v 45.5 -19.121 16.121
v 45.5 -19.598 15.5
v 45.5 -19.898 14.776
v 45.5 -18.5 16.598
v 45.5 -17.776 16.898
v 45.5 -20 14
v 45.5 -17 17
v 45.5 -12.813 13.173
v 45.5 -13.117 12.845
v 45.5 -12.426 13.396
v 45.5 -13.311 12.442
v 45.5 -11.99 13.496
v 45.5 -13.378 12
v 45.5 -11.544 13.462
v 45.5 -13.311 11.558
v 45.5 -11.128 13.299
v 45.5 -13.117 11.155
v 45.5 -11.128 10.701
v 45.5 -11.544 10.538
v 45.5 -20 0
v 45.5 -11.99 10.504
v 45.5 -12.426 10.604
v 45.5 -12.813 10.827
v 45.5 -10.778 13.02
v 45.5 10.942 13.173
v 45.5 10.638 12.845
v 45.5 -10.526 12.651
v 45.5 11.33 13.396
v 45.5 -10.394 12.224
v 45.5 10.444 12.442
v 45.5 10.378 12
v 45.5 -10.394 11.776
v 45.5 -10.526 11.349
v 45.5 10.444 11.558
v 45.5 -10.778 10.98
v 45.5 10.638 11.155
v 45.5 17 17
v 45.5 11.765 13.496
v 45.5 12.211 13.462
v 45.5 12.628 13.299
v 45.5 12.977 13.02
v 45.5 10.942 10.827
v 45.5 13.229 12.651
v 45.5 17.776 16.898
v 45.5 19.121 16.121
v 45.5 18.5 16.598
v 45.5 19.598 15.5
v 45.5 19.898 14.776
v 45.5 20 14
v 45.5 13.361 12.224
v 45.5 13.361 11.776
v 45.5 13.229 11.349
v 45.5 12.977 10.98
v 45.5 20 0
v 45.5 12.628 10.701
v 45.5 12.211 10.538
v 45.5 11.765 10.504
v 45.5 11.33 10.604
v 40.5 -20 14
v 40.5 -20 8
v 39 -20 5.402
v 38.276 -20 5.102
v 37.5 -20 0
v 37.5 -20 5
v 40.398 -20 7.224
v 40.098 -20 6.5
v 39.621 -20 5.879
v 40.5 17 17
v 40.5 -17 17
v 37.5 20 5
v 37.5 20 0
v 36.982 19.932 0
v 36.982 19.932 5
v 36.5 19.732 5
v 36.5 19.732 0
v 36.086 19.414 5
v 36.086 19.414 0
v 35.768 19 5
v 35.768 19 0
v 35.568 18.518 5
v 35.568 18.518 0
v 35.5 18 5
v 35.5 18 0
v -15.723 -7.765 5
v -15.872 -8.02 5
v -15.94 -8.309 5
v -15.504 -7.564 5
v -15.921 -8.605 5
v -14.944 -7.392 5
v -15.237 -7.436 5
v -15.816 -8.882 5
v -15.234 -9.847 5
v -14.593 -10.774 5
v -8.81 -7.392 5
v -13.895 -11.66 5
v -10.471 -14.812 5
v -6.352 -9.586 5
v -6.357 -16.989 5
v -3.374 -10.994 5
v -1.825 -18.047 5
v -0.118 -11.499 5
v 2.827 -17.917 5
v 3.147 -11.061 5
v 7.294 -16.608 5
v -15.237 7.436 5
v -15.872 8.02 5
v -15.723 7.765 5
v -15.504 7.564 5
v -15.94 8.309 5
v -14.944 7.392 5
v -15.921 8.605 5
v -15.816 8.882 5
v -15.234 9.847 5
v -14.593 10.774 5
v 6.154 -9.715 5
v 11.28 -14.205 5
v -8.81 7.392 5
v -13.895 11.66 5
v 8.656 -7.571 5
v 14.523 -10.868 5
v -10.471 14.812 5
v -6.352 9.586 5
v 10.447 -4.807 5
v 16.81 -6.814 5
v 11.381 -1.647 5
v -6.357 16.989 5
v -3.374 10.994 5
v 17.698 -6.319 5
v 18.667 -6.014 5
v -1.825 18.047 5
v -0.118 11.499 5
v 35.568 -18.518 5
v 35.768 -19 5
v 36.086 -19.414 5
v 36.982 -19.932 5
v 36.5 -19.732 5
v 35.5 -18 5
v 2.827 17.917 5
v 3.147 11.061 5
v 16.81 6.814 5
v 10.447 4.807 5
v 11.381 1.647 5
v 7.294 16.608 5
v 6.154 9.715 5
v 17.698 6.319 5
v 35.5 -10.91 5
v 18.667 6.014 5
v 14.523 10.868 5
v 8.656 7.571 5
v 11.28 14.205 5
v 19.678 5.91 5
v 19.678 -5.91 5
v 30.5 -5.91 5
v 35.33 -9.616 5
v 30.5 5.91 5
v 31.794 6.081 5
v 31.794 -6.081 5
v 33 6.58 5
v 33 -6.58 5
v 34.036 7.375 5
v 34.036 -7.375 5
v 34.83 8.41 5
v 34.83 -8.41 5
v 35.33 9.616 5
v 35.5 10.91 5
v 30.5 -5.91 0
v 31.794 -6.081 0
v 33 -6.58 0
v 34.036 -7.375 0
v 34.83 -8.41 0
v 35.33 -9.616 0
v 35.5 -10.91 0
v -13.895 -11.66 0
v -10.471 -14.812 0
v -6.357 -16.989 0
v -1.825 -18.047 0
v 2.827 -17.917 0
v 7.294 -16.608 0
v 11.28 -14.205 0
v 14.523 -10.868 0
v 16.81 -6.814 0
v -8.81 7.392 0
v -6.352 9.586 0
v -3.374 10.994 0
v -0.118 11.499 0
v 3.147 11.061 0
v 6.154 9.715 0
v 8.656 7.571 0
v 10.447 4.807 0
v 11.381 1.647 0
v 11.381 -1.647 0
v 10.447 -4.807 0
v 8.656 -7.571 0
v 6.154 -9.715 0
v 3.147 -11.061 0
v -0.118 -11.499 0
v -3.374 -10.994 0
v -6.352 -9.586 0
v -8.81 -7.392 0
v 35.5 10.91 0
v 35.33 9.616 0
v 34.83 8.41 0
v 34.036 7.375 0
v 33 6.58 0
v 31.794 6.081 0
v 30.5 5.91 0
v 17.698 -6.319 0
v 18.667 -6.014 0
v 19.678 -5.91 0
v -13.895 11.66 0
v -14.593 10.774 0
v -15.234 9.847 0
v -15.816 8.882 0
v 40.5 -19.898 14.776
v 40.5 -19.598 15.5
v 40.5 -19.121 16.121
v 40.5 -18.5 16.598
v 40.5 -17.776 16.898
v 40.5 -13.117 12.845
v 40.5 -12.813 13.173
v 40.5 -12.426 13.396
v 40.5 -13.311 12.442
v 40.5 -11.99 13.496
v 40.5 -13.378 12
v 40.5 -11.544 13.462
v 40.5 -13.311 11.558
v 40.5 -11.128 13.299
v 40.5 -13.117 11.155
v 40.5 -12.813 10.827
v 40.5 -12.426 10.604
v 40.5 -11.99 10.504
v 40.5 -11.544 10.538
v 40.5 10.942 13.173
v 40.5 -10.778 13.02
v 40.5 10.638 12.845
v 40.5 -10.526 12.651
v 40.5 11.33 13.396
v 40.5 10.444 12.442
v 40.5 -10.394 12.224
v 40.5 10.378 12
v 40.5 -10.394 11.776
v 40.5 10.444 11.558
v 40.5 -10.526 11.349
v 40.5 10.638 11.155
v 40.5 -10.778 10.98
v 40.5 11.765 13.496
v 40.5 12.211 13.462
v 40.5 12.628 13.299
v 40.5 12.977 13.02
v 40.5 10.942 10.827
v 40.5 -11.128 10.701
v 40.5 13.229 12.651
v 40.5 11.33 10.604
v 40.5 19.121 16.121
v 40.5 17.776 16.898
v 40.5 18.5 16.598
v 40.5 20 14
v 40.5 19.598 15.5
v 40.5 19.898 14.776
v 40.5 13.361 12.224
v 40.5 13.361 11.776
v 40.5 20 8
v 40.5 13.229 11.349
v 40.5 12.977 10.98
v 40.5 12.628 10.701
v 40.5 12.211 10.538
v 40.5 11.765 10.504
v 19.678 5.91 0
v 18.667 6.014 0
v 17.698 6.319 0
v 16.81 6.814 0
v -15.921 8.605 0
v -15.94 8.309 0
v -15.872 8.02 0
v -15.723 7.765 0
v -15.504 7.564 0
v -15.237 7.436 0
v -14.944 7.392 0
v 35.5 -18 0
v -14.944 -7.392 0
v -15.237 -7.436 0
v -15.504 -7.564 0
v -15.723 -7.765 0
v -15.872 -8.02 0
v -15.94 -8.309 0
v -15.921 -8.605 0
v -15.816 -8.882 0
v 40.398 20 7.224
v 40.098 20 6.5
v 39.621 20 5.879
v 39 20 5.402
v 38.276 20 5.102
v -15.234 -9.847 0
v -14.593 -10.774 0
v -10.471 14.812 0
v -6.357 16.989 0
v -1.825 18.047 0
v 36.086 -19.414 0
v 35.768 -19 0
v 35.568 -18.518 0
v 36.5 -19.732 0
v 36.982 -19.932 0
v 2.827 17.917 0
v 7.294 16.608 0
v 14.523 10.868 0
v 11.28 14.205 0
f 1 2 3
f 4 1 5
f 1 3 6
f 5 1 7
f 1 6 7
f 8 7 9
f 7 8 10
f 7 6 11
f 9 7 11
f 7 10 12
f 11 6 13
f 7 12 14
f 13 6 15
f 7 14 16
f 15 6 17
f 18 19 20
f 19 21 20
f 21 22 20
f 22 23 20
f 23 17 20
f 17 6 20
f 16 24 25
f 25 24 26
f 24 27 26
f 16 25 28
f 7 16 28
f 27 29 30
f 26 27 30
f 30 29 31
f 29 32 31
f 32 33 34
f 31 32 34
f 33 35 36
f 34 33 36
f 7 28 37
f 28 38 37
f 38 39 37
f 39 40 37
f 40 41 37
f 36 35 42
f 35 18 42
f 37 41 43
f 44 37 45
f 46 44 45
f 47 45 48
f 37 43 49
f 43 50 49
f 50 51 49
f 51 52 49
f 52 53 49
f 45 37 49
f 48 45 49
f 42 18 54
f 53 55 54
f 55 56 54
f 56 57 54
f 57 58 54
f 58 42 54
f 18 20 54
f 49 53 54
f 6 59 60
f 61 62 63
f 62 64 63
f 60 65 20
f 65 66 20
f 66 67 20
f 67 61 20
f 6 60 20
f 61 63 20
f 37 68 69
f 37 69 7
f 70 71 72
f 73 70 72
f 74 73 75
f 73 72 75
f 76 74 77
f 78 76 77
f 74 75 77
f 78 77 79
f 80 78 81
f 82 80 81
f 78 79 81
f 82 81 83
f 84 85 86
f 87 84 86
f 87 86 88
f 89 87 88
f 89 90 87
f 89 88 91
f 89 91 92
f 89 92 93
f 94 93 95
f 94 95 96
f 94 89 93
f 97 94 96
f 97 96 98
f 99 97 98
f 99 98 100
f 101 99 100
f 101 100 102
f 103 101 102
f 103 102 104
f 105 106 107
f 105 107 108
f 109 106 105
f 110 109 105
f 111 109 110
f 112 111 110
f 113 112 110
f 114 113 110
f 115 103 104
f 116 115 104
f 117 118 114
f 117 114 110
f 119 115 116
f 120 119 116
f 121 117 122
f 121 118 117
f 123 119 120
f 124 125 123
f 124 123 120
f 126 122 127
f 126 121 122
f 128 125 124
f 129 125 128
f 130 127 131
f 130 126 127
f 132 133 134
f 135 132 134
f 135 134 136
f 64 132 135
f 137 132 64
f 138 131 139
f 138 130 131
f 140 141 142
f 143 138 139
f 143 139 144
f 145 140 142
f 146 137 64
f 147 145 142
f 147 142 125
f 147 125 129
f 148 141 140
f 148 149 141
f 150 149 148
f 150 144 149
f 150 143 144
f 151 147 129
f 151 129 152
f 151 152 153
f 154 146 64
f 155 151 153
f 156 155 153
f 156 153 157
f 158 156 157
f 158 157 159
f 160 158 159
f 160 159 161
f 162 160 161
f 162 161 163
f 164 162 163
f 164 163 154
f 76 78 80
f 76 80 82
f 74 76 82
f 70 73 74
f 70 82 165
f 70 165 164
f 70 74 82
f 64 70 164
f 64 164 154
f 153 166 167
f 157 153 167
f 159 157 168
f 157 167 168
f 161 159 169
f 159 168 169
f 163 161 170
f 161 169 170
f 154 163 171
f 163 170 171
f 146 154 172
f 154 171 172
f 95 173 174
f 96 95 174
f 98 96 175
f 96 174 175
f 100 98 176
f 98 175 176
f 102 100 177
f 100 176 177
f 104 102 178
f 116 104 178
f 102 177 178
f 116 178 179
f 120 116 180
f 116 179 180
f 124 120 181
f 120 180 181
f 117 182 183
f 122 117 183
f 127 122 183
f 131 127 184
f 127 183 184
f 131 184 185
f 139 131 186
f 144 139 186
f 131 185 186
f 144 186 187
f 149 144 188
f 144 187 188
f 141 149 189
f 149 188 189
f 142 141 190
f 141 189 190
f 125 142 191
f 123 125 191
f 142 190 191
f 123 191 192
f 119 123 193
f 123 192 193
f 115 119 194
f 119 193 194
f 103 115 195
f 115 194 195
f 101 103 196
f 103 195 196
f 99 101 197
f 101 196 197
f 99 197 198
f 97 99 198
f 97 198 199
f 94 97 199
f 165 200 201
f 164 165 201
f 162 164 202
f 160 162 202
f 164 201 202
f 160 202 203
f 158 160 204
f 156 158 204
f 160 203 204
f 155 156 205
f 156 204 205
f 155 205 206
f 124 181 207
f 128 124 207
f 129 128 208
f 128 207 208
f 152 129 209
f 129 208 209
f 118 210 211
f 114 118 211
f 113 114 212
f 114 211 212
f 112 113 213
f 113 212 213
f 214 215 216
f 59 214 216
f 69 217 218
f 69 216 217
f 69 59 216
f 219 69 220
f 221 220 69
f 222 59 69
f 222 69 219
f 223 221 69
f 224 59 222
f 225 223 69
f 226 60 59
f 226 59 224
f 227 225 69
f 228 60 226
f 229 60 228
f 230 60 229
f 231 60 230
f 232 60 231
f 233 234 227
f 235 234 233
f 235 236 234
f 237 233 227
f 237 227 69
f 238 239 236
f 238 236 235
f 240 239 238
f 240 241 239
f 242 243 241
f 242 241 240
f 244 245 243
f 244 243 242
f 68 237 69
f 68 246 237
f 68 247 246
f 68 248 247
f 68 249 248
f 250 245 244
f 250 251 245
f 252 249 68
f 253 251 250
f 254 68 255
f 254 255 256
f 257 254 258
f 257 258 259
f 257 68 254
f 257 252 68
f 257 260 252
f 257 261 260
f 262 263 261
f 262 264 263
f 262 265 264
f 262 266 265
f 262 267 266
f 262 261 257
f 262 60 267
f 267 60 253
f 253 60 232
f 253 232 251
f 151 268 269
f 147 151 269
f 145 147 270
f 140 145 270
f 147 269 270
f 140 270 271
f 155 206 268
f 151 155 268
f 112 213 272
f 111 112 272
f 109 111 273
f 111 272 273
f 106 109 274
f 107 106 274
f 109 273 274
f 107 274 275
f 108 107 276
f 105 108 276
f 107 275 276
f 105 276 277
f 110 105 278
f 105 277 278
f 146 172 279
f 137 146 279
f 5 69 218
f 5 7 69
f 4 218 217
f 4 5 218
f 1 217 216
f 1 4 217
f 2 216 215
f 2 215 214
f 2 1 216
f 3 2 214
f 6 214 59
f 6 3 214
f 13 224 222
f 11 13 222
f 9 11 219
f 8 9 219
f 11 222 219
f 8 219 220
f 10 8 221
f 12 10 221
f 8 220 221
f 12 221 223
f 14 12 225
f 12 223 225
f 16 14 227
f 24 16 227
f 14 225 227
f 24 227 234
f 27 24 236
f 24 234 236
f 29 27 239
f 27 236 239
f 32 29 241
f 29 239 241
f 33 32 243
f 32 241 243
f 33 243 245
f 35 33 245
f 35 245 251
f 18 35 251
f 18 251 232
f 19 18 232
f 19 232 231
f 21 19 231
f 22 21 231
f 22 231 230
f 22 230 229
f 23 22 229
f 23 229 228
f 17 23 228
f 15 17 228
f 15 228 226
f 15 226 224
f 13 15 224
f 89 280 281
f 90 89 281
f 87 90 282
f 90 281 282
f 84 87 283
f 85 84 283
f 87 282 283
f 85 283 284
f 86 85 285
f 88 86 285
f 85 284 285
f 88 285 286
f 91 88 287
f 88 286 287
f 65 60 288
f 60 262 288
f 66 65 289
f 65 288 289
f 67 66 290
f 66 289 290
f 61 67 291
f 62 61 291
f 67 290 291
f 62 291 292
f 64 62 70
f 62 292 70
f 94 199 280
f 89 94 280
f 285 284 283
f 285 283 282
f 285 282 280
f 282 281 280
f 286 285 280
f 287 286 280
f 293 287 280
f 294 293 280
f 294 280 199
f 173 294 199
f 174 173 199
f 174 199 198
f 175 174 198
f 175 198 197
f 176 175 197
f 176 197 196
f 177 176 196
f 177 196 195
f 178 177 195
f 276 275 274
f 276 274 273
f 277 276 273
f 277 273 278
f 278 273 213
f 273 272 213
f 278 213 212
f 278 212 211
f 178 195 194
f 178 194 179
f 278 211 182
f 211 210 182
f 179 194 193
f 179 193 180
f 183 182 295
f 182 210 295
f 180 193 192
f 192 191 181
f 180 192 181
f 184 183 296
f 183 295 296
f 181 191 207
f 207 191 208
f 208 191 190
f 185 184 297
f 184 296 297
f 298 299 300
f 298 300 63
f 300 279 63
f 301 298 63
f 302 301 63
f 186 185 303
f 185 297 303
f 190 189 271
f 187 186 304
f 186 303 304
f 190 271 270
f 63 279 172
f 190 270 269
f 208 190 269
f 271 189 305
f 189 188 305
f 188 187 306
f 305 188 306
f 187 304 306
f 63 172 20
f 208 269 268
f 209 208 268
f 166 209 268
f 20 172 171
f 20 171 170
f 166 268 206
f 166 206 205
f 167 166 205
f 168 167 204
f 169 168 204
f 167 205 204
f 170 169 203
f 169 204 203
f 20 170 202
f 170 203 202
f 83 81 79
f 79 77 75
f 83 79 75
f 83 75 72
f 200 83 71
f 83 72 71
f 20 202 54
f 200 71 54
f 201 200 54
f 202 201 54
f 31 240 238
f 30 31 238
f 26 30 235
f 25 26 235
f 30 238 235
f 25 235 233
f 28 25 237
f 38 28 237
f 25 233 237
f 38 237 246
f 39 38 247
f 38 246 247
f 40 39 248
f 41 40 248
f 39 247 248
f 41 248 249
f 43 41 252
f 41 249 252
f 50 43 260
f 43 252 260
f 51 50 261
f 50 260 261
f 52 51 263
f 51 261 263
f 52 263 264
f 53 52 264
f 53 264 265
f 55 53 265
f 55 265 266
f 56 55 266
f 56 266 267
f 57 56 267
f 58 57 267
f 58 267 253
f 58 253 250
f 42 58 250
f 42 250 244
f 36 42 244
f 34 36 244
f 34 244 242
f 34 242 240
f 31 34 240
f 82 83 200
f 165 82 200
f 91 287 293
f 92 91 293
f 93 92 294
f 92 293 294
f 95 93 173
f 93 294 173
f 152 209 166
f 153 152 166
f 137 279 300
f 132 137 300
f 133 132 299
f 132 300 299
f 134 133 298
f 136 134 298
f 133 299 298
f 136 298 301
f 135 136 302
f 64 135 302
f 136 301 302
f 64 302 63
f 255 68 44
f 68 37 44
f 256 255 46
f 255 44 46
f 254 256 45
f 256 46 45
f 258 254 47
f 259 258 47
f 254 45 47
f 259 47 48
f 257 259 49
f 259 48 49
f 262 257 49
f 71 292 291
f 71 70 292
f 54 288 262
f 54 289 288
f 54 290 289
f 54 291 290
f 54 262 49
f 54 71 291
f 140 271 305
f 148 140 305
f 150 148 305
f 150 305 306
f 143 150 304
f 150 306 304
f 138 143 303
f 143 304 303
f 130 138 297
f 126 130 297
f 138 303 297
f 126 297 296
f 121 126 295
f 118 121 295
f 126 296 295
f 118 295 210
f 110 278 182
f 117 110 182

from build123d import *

# Parameters (mm, degrees)
F1_DEPTH = 5
F2_W     = 5
F2_H     = 40
F3_DEPTH = 12
F4_R     = 3
F5_R     = 1.5
F6_DEPTH = 10


with BuildPart() as f1:
    # F0 (on Top) → F1 (new body)
    with BuildSketch(Plane.XY):
        with BuildLine():
            ThreePointArc((-8.809511, 7.392058), (11.5, 0), (-8.809511, -7.392058))
            Line((-8.809511, -7.392058), (-14.94391, -7.392058))
            ThreePointArc((-14.94391, -7.392058), (-15.806941, -7.886907), (-15.815832, -8.881703))
            ThreePointArc((-15.815832, -8.881703), (-14.920363, -10.315422), (-13.895319, -11.659557))
            ThreePointArc((-13.895319, -11.659557), (2.827372, -17.917342), (16.810487, -6.814154))
            ThreePointArc((16.810487, -6.814154), (18.174589, -6.14164), (19.677769, -5.910335))
            Line((19.677769, -5.910335), (30.5, -5.910335))
            ThreePointArc((30.5, -5.910335), (34.035534, -7.374801), (35.5, -10.910335))
            Line((35.5, -10.910335), (35.5, -18))
            ThreePointArc((35.5, -18), (36.085786, -19.414214), (37.5, -20))
            Line((37.5, -20), (45.5, -20))
            Line((45.5, -20), (45.5, 0))
            Line((45.5, 0), (45.5, 20))
            Line((45.5, 20), (37.5, 20))
            ThreePointArc((37.5, 20), (36.085786, 19.414214), (35.5, 18))
            Line((35.5, 18), (35.5, 10.910335))
            ThreePointArc((35.5, 10.910335), (34.035534, 7.374801), (30.5, 5.910335))
            Line((30.5, 5.910335), (19.677769, 5.910335))
            ThreePointArc((19.677769, 5.910335), (18.174589, 6.14164), (16.810487, 6.814154))
            ThreePointArc((16.810487, 6.814154), (2.827372, 17.917342), (-13.895319, 11.659557))
            ThreePointArc((-13.895319, 11.659557), (-14.920363, 10.315422), (-15.815832, 8.881703))
            ThreePointArc((-15.815832, 8.881703), (-15.806941, 7.886907), (-14.94391, 7.392058))
            Line((-14.94391, 7.392058), (-8.809511, 7.392058))
        make_face()
    extrude(amount=F1_DEPTH)

    # F2 (on face) → F3 (join)
    with BuildSketch(Plane.XY.offset(5)):
        with Locations((43, 0)):
            Rectangle(F2_W, F2_H)
    extrude(amount=F3_DEPTH)

    # F4
    f4_edges = [f1.edges().sort_by_distance(p)[0] for p in [
        (40.5, 0, 5),
        (43, 20, 17),
        (43, -20, 17),
    ]]
    fillet(f4_edges, radius=F4_R)

    # F5 (on face) → F6 (cut)
    with BuildSketch(Plane(origin=(40.5, 0, 0), x_dir=(0, -1, 0), z_dir=(-1, 0, 0))):
        with Locations((-11.877556, 12)):
            Circle(F5_R)
        with Locations((11.877556, 12)):
            Circle(F5_R)
    extrude(amount=-F6_DEPTH, mode=Mode.SUBTRACT)


solid = f1.part
